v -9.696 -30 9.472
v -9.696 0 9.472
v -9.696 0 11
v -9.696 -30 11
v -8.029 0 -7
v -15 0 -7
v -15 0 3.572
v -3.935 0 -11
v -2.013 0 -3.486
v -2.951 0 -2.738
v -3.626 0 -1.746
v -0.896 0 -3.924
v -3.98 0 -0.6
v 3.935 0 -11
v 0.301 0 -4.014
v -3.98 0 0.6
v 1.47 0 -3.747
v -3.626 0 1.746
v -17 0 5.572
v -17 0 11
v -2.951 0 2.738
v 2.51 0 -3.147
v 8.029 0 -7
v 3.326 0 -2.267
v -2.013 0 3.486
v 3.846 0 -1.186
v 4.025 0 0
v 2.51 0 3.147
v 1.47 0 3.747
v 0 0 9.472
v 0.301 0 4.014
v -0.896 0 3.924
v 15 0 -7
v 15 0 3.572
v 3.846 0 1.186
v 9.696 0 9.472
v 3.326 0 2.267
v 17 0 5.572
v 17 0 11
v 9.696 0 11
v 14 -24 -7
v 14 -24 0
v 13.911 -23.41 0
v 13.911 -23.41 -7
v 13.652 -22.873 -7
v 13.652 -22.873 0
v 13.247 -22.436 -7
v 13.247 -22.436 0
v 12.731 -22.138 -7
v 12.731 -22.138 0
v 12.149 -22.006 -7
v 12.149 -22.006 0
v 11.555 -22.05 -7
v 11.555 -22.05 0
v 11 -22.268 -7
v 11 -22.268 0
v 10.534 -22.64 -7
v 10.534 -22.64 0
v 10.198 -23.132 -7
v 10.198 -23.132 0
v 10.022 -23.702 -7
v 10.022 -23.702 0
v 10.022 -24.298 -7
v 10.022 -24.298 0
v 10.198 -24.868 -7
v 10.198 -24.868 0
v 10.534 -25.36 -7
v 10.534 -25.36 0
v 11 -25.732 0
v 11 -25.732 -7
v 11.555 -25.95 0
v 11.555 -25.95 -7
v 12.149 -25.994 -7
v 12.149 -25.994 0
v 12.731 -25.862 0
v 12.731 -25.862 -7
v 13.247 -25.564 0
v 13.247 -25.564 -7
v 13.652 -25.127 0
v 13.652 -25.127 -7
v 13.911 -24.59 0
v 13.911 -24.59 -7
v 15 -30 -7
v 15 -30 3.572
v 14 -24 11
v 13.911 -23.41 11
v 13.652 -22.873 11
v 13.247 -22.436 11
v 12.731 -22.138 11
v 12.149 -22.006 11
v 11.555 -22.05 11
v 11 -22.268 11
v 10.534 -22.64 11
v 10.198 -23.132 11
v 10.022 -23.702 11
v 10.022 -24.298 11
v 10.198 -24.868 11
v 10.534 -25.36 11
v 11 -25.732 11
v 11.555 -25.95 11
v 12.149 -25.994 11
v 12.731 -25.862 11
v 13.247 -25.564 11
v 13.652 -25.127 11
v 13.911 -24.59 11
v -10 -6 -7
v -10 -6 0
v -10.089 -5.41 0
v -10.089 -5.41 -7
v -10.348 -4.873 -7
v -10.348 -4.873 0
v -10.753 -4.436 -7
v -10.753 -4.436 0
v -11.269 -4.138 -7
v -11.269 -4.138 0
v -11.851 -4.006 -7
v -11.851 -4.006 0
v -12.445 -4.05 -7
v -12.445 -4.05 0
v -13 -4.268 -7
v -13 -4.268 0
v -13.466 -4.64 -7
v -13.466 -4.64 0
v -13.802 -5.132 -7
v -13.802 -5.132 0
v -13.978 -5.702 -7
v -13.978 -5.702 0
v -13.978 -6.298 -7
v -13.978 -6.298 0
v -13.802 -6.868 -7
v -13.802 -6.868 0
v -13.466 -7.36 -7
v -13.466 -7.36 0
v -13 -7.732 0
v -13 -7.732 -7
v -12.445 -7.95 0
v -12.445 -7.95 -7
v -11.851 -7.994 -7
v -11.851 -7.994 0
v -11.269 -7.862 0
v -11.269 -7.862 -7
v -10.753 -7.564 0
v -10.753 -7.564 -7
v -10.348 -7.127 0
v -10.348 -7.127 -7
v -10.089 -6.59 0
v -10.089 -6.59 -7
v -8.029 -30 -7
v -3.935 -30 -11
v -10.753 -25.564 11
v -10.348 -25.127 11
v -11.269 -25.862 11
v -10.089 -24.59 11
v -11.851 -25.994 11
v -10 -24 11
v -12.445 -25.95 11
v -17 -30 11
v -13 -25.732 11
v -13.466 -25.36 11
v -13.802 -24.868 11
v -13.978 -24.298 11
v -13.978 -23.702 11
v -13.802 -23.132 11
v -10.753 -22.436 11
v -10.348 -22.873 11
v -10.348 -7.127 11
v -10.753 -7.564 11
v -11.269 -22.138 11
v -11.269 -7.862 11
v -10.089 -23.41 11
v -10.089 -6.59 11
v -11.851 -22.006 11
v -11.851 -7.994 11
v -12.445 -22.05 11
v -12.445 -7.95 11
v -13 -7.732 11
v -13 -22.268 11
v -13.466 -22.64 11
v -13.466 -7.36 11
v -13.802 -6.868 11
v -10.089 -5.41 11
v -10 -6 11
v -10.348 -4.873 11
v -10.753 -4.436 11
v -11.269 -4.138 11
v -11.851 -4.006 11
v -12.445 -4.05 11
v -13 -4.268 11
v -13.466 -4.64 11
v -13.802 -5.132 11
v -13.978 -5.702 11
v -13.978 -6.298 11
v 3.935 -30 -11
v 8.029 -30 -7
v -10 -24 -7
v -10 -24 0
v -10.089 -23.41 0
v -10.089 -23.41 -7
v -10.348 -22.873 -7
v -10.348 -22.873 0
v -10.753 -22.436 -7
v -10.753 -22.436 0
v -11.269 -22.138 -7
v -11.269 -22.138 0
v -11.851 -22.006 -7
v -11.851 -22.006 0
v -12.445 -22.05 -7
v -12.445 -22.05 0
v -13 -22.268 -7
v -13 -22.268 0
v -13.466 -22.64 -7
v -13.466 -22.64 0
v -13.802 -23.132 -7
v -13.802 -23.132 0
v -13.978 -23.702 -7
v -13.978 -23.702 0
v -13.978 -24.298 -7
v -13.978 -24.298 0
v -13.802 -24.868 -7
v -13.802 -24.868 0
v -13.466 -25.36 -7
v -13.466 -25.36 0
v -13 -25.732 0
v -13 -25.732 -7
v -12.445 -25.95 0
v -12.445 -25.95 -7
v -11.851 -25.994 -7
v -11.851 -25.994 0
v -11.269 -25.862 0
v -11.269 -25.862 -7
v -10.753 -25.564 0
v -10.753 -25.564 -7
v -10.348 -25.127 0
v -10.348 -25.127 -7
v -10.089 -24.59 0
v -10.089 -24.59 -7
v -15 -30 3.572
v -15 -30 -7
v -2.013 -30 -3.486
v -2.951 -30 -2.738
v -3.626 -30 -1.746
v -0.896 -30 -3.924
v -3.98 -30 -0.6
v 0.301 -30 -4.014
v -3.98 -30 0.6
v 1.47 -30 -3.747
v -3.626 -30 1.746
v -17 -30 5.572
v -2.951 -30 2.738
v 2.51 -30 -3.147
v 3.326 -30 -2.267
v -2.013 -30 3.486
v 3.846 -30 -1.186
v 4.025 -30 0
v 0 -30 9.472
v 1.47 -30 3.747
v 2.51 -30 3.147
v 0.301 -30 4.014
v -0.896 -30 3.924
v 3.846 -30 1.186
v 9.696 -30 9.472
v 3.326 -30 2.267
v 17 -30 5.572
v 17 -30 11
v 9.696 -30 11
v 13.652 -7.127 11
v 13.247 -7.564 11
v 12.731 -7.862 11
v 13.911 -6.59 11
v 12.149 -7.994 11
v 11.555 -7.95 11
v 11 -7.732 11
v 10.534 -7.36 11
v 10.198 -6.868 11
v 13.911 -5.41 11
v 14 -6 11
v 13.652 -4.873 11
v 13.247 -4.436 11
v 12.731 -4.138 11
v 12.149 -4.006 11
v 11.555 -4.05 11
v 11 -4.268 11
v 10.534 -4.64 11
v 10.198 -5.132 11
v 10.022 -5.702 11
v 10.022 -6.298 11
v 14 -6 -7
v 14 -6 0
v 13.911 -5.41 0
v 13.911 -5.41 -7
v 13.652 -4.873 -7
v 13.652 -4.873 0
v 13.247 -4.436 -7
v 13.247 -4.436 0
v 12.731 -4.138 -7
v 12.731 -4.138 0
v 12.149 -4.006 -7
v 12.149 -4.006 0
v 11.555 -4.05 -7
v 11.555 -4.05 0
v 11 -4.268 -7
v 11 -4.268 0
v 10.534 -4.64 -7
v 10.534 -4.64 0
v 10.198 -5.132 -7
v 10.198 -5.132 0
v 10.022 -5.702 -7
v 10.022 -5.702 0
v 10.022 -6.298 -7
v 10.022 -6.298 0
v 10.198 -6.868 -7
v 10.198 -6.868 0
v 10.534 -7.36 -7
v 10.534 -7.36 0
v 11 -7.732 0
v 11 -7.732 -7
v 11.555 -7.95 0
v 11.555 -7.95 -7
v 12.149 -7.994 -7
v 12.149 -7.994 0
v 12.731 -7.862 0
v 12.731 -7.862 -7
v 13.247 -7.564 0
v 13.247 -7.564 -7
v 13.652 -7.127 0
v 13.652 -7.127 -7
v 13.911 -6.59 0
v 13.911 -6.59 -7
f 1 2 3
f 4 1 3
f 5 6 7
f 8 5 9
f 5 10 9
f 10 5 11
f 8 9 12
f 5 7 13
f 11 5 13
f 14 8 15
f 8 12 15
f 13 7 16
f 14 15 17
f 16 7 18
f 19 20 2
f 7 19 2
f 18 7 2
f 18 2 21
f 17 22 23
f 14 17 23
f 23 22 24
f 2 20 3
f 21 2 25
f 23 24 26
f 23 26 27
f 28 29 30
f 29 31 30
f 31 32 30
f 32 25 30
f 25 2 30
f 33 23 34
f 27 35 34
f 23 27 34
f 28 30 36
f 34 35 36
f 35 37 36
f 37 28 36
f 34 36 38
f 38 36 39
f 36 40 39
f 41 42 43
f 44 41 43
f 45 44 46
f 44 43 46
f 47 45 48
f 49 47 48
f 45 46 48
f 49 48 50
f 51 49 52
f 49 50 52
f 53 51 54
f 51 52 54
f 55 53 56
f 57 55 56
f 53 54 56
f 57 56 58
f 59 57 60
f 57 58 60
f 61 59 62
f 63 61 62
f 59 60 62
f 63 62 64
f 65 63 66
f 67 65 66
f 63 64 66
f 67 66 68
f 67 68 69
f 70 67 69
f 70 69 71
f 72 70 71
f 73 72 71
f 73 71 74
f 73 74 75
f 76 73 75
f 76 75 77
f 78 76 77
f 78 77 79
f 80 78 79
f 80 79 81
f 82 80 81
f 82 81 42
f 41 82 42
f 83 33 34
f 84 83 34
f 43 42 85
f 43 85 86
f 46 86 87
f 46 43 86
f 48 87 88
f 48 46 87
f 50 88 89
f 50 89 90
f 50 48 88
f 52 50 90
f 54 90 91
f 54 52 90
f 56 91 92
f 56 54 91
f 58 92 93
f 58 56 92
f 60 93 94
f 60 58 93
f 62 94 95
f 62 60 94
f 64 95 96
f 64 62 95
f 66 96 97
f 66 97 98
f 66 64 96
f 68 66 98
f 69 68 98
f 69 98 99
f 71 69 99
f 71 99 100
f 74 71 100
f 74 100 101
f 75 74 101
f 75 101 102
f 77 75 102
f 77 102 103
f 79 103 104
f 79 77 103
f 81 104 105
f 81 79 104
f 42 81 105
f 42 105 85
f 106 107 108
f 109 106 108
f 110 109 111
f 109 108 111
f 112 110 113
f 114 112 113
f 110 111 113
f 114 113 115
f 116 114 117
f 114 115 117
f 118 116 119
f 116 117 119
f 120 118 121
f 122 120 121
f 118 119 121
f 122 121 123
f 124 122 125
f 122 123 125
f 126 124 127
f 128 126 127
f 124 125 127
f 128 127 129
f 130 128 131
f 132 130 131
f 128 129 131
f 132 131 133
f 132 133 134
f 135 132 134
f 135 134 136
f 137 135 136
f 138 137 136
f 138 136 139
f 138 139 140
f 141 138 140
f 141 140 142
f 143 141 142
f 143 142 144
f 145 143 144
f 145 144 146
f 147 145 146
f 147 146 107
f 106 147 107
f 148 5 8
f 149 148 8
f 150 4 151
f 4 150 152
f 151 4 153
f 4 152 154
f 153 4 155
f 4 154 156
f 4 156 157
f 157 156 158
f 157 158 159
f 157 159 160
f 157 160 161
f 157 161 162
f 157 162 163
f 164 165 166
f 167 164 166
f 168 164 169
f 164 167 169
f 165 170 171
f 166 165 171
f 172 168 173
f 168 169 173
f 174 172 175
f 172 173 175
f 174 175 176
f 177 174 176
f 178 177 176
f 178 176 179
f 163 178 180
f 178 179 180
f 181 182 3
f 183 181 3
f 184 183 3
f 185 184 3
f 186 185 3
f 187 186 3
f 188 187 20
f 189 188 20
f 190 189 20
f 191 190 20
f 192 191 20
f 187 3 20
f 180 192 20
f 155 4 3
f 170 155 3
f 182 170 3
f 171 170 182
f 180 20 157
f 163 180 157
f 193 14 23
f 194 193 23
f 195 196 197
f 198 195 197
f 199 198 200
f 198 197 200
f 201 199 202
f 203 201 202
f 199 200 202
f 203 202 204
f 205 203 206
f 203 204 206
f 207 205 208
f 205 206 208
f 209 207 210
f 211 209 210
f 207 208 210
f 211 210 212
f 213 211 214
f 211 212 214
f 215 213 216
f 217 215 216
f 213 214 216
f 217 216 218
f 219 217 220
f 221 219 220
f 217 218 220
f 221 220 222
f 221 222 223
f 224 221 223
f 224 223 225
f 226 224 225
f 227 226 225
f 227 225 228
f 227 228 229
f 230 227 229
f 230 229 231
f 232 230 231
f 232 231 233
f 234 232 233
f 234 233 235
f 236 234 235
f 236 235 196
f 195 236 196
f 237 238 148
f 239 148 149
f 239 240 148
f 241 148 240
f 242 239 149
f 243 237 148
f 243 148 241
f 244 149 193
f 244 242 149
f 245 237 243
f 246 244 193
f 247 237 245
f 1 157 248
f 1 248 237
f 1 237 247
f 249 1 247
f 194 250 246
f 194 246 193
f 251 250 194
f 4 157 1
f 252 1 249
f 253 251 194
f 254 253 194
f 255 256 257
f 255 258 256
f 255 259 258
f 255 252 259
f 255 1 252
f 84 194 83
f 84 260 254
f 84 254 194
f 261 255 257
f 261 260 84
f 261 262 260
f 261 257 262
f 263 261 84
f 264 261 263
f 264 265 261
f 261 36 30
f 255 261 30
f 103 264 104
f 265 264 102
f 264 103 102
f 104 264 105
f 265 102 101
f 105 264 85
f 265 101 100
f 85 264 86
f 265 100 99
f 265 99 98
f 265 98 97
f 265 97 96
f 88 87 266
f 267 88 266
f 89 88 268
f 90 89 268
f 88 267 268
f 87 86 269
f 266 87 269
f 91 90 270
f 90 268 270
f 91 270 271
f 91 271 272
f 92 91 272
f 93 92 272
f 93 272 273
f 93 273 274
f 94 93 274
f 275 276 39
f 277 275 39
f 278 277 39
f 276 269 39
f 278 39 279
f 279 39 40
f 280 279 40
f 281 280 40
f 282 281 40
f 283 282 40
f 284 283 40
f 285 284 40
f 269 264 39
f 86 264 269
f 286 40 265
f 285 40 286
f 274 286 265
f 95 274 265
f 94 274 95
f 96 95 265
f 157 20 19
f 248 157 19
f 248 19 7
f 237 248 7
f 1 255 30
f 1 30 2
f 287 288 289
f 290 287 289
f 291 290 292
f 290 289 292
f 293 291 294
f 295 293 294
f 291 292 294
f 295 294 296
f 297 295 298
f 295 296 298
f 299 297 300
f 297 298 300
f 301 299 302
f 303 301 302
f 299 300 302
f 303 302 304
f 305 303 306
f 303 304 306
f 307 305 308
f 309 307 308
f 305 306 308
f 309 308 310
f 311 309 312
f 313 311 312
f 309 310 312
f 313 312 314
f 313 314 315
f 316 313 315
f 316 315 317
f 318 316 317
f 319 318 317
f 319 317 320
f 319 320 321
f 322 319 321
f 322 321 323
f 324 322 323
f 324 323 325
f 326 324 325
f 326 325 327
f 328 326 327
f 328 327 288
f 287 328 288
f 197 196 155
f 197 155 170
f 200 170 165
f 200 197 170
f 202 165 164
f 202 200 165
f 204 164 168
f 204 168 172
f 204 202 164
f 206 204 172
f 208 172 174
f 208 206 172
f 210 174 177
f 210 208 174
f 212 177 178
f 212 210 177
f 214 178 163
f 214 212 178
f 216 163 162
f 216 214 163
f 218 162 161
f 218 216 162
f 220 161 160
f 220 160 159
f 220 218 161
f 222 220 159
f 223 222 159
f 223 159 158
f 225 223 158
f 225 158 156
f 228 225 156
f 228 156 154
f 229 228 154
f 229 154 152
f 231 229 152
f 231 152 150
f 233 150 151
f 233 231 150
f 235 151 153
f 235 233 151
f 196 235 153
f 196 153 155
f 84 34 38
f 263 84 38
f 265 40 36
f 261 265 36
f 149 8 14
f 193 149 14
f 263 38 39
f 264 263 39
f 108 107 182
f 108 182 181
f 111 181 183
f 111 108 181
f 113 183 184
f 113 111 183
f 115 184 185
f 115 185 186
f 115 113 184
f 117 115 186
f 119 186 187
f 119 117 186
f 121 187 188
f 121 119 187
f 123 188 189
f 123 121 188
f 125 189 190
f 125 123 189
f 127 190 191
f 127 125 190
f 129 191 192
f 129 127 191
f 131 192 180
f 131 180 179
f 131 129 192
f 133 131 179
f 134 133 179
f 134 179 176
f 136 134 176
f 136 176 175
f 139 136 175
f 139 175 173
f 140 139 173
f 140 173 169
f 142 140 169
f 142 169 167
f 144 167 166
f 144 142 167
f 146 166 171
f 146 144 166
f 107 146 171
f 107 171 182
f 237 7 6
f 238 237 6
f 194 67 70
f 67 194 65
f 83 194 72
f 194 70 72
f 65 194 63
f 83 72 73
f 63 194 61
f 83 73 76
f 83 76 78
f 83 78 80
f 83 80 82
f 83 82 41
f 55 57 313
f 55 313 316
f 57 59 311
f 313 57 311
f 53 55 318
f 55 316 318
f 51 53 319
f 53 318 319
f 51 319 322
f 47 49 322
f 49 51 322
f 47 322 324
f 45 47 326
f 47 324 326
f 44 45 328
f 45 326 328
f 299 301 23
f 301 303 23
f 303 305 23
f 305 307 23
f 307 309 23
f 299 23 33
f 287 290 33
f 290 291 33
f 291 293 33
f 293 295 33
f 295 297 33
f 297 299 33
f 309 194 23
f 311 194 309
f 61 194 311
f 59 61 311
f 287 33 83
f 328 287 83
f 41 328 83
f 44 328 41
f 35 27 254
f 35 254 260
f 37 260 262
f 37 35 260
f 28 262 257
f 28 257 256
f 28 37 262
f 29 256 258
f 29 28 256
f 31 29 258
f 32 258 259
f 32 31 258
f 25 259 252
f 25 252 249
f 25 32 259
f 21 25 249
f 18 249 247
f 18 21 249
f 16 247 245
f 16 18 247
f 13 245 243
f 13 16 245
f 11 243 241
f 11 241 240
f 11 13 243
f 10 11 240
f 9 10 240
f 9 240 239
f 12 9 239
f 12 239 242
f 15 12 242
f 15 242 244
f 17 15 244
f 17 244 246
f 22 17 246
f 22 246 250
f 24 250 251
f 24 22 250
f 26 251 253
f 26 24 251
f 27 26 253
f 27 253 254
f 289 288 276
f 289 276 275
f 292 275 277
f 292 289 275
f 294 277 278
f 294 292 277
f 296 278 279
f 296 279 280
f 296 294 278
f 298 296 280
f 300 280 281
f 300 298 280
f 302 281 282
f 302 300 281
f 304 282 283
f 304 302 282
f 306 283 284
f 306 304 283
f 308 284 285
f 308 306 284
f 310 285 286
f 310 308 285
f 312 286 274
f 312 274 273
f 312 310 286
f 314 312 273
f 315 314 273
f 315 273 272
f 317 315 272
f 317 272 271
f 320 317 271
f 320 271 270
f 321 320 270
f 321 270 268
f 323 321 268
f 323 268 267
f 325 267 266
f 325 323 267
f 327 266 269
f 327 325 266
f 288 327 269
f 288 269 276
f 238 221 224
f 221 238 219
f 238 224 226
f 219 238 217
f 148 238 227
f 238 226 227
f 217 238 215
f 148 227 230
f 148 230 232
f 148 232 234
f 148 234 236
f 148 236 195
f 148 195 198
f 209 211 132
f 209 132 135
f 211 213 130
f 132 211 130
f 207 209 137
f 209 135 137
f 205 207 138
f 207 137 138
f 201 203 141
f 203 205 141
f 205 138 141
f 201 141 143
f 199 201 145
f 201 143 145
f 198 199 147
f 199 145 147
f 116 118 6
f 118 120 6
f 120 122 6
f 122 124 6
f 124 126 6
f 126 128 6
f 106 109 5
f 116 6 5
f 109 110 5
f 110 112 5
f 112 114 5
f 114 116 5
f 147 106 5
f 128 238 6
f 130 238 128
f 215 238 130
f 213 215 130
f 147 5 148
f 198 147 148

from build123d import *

# Parameters (mm, degrees)
F0_R          = 4.025
F1_DEPTH      = 30
F2_R          = 2
F3_DEPTH      = 10.9999993406
F3_DEPTH_BACK = 25


# Not quite as in the source:
# - ends of sketch curves that miss each other by under 0.0002 mm in the source are joined


with BuildPart() as f1:
    # F0 (on Front) → F1 (new body)
    with BuildSketch(Plane.XZ):
        Polygon((-17, 10.9999990659), (-17, 5.5723366328), (-15, 3.5723366328), (-15, -7.0000008242), (-8.0288857139, -7.0000004412), (-3.9351008678, -11.0000002162), (3.022e-07, -11), (3.9351014722, -10.9999997838), (8.0288857139, -7.0000004412), (15, -7.0000008242), (15, 3.5723366328), (17, 5.5723366328), (17, 10.9999990659), (9.6955373869, 10.9999994673), (9.6955373029, 9.4717088947), (8.4e-08, 9.4717094274), (-9.6955373029, 9.4717088947), (-9.6955373869, 10.9999994673), align=None)
        Circle(F0_R, mode=Mode.SUBTRACT)
    extrude(amount=F1_DEPTH)

    # F2 (on Top) → F3 (cut, two sides)
    with BuildSketch(Plane.XY) as f3_sk:
        with Locations((-12, -6)):
            Circle(F2_R)
        with Locations((-12, -24)):
            Circle(F2_R)
        with Locations((12, -6)):
            Circle(F2_R)
        with Locations((12, -24)):
            Circle(F2_R)
    extrude(amount=F3_DEPTH, mode=Mode.SUBTRACT)
    extrude(f3_sk.sketch, amount=-F3_DEPTH_BACK, mode=Mode.SUBTRACT)


solid = f1.part
